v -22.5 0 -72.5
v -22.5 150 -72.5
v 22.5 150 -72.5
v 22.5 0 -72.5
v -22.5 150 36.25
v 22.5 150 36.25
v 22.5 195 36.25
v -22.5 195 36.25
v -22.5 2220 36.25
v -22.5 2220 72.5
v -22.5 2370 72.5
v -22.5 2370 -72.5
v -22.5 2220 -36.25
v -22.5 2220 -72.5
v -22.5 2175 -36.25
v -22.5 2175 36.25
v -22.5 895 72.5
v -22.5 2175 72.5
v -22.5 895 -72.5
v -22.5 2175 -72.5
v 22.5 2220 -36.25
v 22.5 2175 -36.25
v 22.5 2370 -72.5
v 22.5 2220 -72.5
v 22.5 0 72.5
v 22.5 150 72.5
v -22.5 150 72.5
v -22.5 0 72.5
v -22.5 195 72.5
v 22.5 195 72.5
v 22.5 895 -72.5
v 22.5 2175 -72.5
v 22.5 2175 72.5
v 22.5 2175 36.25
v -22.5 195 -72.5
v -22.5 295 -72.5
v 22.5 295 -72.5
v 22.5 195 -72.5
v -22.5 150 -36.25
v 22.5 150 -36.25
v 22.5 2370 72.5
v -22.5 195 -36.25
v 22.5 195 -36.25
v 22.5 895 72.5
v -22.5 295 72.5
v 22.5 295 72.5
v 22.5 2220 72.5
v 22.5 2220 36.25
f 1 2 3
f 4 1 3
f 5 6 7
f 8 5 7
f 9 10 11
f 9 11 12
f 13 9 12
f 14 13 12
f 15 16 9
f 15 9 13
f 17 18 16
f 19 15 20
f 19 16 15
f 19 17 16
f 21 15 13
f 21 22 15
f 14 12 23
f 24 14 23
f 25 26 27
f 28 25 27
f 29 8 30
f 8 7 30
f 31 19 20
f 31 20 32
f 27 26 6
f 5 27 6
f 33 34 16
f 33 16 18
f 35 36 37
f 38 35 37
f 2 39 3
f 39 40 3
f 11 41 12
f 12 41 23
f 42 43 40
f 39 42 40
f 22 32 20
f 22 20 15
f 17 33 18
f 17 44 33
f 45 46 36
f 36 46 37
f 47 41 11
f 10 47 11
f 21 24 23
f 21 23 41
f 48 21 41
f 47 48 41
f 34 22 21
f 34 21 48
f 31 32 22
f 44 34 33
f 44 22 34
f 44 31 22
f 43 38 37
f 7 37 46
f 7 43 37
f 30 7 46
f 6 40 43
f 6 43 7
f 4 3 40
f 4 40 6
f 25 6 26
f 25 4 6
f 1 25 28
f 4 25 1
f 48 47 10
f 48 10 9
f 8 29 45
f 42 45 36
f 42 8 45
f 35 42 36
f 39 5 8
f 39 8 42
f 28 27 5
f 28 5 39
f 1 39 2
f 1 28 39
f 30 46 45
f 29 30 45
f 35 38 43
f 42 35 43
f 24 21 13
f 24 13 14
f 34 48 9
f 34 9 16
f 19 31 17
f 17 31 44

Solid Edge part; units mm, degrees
sketch "Sketch1" plane through (0, 0, 0) normal (0, -1, 0) x (1, 0, 0)
  line L0 (-22.5, -72.5) -> (22.5, -72.5)
  line L1 (22.5, -72.5) -> (22.5, 72.5)
  line L2 (22.5, 72.5) -> (-22.5, 72.5)
  line L3 (-22.5, 72.5) -> (-22.5, -72.5)
extrude "Protrusion1" add sketch "Sketch1" against normal blind 2370
sketch "Sketch2" plane through (22.5, 1185, 0) normal (1, 0, 0) x (0, 1, 0)
  line L0 (1035, 72.5) -> (1035, 36.25)
  line L1 (1035, 36.25) -> (990, 36.25)
  line L2 (990, 36.25) -> (990, 72.5)
  line L3 (990, 72.5) -> (1035, 72.5)
  line L4 (-1035, 72.5) -> (-1035, 36.25)
  line L5 (-1035, 36.25) -> (-990, 36.25)
  line L6 (-990, 36.25) -> (-990, 72.5)
  line L7 (-990, 72.5) -> (-1035, 72.5)
extrude "ExtrudedCutout_1" cut sketch "Sketch2" against normal blind 89.2118
mirror "Mirror1" about plane through (0, 0, 0) normal (0, 0, -1) of "ExtrudedCutout_1"
sketch "Sketch3" plane through (22.5, 1185, 0) normal (1, 0, 0) x (0, 1, 0)
  line L0 (-890, 72.5) -> (-890, -72.5)
  line L1 (-890, -72.5) -> (-290, -72.5)
  line L2 (-290, -72.5) -> (-290, 72.5)
  line L3 (-290, 72.5) -> (-890, 72.5)
extrude "ExtrudedCutout_2" cut sketch "Sketch3" against normal blind 76.7872
properties material "Wood, Pine"
